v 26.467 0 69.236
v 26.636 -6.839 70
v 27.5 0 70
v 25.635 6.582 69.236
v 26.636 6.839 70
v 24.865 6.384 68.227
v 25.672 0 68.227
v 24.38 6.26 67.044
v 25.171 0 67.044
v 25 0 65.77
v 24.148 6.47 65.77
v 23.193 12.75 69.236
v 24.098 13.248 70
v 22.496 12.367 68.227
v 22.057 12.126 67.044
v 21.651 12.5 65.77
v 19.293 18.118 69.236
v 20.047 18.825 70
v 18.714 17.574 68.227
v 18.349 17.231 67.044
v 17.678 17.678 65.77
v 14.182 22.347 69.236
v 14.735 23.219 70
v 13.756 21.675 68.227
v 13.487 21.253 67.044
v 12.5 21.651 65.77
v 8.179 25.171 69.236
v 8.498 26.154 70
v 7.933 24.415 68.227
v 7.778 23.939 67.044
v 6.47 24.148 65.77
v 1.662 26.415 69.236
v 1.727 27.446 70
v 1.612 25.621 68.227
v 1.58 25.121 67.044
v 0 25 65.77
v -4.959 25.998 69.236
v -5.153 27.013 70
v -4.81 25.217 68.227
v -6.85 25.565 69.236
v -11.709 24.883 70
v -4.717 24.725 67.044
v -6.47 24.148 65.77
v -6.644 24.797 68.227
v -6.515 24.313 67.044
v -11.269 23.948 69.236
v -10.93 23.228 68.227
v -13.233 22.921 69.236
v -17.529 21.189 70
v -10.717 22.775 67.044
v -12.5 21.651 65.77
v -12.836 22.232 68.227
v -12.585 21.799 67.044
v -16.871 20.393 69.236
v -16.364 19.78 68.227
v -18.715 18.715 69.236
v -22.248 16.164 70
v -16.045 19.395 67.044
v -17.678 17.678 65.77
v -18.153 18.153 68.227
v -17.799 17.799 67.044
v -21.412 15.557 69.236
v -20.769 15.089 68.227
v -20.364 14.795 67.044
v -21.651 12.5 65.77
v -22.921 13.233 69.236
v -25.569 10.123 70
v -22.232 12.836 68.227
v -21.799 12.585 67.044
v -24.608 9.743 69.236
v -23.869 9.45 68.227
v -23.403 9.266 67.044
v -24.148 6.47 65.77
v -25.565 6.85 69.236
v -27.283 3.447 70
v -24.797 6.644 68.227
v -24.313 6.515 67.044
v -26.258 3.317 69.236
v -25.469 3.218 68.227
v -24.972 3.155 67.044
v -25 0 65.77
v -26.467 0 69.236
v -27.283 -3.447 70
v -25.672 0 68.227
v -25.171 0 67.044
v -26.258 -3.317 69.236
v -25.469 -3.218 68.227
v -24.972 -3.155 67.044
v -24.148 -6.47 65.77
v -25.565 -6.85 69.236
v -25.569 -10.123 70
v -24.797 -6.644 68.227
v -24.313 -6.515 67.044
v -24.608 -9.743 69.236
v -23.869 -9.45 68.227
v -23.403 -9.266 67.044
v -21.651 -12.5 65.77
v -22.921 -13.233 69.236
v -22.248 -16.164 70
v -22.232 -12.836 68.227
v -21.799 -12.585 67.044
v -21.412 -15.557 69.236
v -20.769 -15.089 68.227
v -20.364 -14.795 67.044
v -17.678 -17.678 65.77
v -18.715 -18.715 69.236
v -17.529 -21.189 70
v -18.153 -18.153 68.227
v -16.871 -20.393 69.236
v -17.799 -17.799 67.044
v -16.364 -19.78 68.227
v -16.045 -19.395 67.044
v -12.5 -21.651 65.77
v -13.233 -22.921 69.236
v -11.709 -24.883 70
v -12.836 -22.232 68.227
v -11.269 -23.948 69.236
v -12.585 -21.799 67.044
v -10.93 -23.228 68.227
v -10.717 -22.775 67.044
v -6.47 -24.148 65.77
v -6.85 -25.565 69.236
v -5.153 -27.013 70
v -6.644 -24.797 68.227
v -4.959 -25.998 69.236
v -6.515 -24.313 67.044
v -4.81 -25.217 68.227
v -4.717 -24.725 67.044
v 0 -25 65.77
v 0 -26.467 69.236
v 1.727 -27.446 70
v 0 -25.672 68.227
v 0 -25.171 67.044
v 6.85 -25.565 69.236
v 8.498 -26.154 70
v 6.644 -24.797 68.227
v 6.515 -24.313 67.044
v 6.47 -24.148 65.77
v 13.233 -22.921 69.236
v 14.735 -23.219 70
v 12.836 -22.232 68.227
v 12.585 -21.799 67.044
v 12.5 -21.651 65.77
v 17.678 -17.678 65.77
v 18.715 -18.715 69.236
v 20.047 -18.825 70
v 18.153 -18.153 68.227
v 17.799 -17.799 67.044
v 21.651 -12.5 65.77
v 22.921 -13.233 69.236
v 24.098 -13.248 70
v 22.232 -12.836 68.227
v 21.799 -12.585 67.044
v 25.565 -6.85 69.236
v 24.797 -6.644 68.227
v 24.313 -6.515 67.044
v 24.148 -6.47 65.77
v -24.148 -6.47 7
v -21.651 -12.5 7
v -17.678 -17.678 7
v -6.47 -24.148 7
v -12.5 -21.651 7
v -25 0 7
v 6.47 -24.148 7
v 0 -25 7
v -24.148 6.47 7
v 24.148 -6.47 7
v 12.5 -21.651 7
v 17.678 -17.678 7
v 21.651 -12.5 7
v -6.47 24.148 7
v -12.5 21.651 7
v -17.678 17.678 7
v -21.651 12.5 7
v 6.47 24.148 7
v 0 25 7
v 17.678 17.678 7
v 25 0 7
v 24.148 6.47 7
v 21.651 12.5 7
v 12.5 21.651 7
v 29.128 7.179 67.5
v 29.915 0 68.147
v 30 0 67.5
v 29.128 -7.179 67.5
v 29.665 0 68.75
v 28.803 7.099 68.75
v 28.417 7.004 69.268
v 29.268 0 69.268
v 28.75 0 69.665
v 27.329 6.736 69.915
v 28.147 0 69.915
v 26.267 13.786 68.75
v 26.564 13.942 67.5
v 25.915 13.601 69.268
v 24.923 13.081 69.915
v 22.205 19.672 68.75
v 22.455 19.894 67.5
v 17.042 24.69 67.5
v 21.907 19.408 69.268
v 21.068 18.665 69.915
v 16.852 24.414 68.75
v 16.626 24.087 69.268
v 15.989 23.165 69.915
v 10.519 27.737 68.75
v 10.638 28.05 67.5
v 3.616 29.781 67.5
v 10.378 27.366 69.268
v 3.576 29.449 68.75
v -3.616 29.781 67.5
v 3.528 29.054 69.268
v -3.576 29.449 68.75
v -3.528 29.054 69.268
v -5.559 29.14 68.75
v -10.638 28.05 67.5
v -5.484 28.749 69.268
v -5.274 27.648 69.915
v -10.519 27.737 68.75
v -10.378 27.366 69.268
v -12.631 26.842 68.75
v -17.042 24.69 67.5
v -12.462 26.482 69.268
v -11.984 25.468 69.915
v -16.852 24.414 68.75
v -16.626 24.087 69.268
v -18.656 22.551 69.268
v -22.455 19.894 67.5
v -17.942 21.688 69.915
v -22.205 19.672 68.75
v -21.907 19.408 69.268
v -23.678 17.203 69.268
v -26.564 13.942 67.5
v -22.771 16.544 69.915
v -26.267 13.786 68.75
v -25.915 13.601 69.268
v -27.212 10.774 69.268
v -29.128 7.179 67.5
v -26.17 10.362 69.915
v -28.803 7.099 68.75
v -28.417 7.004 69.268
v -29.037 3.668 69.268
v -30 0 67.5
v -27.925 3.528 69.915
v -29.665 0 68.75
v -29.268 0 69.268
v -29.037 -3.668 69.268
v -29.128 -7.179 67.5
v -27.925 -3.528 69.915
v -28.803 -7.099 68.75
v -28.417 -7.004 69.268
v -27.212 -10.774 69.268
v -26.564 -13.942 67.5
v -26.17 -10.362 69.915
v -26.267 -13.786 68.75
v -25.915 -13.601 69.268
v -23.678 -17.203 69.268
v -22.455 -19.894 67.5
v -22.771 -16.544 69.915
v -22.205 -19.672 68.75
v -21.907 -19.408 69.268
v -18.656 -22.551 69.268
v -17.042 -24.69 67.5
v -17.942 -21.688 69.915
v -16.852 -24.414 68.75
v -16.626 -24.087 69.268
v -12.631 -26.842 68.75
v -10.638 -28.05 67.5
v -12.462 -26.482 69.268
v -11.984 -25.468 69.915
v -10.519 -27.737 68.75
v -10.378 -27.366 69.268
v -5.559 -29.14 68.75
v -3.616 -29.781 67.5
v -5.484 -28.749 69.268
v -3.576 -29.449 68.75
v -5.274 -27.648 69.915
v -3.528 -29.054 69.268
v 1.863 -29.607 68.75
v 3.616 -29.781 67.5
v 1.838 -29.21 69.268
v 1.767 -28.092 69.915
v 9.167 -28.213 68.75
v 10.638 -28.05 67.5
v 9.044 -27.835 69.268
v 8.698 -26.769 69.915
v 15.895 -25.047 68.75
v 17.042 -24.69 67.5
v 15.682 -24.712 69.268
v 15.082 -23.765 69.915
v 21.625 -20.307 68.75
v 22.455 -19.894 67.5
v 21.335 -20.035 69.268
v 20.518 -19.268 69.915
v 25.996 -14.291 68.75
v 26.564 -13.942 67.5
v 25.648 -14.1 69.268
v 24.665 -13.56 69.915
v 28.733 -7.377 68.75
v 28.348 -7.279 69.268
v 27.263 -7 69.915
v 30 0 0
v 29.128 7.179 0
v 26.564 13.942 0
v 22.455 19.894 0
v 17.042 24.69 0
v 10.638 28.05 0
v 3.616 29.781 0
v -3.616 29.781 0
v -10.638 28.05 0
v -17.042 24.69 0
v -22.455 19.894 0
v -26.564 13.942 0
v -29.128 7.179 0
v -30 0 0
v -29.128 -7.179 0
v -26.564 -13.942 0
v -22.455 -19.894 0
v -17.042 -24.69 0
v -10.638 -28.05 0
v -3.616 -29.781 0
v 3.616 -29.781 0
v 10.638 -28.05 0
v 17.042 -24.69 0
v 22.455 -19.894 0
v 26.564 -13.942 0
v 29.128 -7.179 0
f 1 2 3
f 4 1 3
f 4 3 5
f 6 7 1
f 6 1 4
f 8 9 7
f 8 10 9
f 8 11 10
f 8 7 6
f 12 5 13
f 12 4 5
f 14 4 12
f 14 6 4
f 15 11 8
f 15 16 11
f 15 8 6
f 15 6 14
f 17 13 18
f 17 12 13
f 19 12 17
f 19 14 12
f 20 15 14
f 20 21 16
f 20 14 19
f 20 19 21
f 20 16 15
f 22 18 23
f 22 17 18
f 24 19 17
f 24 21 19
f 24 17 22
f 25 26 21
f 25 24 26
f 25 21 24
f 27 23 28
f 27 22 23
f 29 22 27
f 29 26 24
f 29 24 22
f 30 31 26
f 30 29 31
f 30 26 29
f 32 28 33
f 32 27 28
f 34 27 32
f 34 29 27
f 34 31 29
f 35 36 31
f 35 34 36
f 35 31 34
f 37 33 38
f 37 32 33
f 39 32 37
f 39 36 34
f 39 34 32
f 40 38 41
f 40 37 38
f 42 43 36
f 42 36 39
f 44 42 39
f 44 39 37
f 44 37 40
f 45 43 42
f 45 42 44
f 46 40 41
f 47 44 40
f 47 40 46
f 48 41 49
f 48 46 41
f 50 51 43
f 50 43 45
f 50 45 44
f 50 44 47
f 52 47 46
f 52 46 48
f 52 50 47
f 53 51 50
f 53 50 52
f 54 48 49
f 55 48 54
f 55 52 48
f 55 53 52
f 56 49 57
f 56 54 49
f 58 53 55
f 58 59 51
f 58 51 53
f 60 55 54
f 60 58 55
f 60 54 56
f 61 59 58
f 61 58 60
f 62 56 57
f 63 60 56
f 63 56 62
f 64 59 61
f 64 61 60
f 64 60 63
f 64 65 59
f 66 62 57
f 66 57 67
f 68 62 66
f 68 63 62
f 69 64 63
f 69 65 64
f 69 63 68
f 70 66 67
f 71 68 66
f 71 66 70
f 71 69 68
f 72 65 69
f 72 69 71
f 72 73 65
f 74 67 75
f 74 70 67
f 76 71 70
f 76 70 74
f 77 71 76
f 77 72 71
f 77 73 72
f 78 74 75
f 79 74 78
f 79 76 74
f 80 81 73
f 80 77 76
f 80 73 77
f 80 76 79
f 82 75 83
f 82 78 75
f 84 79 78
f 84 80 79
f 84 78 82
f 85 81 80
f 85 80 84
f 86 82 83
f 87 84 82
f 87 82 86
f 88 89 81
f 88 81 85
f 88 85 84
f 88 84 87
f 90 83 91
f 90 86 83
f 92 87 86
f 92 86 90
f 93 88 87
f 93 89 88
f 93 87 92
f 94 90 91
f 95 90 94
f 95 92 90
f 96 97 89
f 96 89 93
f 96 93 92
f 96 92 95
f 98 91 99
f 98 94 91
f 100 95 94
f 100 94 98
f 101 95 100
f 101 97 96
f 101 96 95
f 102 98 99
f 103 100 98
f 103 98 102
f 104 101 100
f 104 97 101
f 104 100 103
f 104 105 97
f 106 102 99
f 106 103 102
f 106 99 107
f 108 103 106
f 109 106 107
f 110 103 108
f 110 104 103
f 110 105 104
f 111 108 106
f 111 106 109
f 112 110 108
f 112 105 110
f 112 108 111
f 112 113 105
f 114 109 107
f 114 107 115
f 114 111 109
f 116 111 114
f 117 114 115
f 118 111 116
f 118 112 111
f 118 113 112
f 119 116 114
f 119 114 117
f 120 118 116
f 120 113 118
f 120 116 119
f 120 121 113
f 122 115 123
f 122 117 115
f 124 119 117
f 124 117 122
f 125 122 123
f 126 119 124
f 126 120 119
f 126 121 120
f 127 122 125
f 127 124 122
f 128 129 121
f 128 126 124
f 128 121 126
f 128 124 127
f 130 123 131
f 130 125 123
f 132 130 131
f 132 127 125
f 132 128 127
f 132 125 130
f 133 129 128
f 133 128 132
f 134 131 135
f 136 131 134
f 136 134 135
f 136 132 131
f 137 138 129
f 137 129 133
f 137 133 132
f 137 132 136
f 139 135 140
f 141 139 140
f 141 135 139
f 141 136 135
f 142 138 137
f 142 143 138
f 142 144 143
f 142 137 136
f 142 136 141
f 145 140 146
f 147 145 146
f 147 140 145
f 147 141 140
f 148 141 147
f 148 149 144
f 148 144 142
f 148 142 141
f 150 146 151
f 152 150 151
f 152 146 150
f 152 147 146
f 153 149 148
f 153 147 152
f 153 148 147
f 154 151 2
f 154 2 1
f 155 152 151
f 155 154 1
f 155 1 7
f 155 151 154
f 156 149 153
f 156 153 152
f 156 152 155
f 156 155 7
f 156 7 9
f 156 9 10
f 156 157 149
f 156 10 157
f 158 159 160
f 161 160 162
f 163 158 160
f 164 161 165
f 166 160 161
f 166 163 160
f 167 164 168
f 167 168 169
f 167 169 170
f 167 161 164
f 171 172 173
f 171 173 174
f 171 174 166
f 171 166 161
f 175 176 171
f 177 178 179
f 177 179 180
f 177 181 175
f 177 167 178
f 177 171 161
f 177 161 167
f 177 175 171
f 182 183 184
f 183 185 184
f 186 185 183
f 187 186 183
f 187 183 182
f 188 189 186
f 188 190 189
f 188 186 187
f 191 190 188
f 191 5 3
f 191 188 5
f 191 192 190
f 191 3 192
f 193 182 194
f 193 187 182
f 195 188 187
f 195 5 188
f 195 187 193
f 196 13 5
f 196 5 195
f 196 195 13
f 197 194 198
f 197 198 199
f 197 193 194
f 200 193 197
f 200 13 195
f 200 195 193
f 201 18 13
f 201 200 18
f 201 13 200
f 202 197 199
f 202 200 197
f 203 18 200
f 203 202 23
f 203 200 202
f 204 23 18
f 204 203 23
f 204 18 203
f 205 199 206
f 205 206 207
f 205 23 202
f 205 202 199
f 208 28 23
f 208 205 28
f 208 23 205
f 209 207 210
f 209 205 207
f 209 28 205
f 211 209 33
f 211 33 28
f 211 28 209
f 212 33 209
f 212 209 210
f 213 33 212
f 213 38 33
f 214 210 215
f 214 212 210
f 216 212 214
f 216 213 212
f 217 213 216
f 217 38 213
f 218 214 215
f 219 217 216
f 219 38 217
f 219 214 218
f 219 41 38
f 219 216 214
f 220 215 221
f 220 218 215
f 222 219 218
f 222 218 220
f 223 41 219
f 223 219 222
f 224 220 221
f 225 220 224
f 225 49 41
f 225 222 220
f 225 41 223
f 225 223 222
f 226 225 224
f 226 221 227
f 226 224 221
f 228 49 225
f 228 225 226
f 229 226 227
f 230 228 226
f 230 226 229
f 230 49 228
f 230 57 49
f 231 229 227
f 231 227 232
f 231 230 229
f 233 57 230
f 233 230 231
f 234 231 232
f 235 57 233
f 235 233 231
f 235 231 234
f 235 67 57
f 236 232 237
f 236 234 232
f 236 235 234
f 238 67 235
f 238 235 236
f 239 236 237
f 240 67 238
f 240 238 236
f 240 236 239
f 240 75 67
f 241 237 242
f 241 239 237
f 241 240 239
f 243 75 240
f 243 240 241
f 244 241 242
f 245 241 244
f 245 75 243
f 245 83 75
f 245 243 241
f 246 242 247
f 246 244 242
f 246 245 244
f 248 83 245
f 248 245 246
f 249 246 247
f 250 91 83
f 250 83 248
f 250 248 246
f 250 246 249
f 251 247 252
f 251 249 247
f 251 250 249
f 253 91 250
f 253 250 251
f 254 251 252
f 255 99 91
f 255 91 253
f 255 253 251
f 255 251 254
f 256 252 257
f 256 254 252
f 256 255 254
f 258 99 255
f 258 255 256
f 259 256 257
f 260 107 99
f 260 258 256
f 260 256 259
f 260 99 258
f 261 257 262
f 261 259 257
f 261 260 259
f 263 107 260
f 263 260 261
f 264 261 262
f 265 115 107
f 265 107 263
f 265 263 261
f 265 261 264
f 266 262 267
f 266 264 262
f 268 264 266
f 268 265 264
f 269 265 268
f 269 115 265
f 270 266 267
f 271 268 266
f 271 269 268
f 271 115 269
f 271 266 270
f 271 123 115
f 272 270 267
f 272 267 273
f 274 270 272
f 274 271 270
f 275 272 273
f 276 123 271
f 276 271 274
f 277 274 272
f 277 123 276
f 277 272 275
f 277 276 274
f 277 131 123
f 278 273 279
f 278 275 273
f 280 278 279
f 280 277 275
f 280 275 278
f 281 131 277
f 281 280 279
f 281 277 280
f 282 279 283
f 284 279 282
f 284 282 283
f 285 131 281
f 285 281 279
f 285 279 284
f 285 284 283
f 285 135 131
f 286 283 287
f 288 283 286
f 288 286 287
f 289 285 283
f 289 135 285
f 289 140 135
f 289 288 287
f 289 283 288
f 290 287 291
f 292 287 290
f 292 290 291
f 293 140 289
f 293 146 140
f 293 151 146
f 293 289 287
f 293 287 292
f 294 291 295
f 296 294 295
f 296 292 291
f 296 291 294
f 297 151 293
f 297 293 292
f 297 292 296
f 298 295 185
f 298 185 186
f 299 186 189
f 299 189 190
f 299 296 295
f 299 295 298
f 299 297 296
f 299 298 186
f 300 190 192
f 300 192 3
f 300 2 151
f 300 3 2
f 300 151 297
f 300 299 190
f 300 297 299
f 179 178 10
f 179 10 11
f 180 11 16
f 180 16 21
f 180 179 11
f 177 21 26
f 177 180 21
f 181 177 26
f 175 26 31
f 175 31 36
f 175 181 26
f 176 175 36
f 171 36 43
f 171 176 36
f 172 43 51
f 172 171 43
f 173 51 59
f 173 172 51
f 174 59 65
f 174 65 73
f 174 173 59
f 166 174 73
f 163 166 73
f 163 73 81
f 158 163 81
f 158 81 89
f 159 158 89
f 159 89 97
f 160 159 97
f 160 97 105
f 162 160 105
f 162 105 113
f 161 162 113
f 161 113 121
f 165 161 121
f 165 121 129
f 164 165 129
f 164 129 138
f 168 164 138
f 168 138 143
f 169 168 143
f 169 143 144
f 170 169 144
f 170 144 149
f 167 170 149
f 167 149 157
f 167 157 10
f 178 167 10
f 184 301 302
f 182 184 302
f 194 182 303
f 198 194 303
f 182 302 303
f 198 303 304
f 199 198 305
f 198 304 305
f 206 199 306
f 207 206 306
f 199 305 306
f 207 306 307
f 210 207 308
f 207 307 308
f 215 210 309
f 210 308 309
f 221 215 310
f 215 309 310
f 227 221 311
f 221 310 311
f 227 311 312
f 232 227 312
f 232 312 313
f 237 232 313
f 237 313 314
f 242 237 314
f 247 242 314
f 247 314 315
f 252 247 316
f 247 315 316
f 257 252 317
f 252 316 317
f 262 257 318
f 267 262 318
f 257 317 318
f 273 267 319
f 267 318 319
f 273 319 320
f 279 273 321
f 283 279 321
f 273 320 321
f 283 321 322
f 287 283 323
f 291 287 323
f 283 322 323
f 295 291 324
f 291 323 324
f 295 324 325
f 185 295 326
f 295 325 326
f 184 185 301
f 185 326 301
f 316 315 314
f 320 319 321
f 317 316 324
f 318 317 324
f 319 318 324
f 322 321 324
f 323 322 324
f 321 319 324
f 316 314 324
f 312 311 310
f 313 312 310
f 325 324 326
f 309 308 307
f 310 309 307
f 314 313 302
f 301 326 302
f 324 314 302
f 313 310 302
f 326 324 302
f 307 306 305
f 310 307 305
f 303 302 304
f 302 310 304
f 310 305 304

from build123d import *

# Parameters (mm, degrees)
F0_R     = 30
F0_R_2   = 25
F1_DEPTH = 70
F2_DEPTH = 7
F3_R     = 2.5


# Not quite as in the source:
# - a fillet or chamfer that OpenCascade refuses, or shapes differently, is made with other operations: its cross-section is extruded or revolved along the edge and cut away or added


with BuildPart() as f1:
    # F0 (on Top) → F1 (new body)
    with BuildSketch(Plane.XY):
        Circle(F0_R)
        Circle(F0_R_2, mode=Mode.SUBTRACT)
    extrude(amount=F1_DEPTH)

    # F0 (on Top) → F2 (join)
    with BuildSketch(Plane.XY):
        Circle(F0_R_2)
    extrude(amount=F2_DEPTH)

    # F3
    f3_edges = [f1.edges().sort_by_distance(p)[0] for p in [
        (-30, 0, 70),
    ]]
    fillet(f3_edges, radius=F3_R)

    # F4: fillet of radius 4.8284271247 on 1 edges, made by hand

    # F4_s1 → F4_t2 (revolve, cut)
    with BuildSketch(Plane.XZ):
        with BuildLine():
            ThreePointArc((27.5, 70), (25.6717247547, 68.2268227163), (25, 65.7700903528))
            Line((25, 65.7700903528), (24.9034314575, 65.7700903528))
            Line((24.9034314575, 65.7700903528), (24.9034314575, 70))
            Line((24.9034314575, 70), (25, 70.0965685425))
            ThreePointArc((25, 70.0965685425), (26.25, 70.0965685425), (27.4534314575, 70.0845981929))
            Line((27.4534314575, 70.0845981929), (27.5, 70))
        make_face()
    revolve(axis=Axis((0, 0, 70), (0, 0, 1)), mode=Mode.SUBTRACT)


solid = f1.part
